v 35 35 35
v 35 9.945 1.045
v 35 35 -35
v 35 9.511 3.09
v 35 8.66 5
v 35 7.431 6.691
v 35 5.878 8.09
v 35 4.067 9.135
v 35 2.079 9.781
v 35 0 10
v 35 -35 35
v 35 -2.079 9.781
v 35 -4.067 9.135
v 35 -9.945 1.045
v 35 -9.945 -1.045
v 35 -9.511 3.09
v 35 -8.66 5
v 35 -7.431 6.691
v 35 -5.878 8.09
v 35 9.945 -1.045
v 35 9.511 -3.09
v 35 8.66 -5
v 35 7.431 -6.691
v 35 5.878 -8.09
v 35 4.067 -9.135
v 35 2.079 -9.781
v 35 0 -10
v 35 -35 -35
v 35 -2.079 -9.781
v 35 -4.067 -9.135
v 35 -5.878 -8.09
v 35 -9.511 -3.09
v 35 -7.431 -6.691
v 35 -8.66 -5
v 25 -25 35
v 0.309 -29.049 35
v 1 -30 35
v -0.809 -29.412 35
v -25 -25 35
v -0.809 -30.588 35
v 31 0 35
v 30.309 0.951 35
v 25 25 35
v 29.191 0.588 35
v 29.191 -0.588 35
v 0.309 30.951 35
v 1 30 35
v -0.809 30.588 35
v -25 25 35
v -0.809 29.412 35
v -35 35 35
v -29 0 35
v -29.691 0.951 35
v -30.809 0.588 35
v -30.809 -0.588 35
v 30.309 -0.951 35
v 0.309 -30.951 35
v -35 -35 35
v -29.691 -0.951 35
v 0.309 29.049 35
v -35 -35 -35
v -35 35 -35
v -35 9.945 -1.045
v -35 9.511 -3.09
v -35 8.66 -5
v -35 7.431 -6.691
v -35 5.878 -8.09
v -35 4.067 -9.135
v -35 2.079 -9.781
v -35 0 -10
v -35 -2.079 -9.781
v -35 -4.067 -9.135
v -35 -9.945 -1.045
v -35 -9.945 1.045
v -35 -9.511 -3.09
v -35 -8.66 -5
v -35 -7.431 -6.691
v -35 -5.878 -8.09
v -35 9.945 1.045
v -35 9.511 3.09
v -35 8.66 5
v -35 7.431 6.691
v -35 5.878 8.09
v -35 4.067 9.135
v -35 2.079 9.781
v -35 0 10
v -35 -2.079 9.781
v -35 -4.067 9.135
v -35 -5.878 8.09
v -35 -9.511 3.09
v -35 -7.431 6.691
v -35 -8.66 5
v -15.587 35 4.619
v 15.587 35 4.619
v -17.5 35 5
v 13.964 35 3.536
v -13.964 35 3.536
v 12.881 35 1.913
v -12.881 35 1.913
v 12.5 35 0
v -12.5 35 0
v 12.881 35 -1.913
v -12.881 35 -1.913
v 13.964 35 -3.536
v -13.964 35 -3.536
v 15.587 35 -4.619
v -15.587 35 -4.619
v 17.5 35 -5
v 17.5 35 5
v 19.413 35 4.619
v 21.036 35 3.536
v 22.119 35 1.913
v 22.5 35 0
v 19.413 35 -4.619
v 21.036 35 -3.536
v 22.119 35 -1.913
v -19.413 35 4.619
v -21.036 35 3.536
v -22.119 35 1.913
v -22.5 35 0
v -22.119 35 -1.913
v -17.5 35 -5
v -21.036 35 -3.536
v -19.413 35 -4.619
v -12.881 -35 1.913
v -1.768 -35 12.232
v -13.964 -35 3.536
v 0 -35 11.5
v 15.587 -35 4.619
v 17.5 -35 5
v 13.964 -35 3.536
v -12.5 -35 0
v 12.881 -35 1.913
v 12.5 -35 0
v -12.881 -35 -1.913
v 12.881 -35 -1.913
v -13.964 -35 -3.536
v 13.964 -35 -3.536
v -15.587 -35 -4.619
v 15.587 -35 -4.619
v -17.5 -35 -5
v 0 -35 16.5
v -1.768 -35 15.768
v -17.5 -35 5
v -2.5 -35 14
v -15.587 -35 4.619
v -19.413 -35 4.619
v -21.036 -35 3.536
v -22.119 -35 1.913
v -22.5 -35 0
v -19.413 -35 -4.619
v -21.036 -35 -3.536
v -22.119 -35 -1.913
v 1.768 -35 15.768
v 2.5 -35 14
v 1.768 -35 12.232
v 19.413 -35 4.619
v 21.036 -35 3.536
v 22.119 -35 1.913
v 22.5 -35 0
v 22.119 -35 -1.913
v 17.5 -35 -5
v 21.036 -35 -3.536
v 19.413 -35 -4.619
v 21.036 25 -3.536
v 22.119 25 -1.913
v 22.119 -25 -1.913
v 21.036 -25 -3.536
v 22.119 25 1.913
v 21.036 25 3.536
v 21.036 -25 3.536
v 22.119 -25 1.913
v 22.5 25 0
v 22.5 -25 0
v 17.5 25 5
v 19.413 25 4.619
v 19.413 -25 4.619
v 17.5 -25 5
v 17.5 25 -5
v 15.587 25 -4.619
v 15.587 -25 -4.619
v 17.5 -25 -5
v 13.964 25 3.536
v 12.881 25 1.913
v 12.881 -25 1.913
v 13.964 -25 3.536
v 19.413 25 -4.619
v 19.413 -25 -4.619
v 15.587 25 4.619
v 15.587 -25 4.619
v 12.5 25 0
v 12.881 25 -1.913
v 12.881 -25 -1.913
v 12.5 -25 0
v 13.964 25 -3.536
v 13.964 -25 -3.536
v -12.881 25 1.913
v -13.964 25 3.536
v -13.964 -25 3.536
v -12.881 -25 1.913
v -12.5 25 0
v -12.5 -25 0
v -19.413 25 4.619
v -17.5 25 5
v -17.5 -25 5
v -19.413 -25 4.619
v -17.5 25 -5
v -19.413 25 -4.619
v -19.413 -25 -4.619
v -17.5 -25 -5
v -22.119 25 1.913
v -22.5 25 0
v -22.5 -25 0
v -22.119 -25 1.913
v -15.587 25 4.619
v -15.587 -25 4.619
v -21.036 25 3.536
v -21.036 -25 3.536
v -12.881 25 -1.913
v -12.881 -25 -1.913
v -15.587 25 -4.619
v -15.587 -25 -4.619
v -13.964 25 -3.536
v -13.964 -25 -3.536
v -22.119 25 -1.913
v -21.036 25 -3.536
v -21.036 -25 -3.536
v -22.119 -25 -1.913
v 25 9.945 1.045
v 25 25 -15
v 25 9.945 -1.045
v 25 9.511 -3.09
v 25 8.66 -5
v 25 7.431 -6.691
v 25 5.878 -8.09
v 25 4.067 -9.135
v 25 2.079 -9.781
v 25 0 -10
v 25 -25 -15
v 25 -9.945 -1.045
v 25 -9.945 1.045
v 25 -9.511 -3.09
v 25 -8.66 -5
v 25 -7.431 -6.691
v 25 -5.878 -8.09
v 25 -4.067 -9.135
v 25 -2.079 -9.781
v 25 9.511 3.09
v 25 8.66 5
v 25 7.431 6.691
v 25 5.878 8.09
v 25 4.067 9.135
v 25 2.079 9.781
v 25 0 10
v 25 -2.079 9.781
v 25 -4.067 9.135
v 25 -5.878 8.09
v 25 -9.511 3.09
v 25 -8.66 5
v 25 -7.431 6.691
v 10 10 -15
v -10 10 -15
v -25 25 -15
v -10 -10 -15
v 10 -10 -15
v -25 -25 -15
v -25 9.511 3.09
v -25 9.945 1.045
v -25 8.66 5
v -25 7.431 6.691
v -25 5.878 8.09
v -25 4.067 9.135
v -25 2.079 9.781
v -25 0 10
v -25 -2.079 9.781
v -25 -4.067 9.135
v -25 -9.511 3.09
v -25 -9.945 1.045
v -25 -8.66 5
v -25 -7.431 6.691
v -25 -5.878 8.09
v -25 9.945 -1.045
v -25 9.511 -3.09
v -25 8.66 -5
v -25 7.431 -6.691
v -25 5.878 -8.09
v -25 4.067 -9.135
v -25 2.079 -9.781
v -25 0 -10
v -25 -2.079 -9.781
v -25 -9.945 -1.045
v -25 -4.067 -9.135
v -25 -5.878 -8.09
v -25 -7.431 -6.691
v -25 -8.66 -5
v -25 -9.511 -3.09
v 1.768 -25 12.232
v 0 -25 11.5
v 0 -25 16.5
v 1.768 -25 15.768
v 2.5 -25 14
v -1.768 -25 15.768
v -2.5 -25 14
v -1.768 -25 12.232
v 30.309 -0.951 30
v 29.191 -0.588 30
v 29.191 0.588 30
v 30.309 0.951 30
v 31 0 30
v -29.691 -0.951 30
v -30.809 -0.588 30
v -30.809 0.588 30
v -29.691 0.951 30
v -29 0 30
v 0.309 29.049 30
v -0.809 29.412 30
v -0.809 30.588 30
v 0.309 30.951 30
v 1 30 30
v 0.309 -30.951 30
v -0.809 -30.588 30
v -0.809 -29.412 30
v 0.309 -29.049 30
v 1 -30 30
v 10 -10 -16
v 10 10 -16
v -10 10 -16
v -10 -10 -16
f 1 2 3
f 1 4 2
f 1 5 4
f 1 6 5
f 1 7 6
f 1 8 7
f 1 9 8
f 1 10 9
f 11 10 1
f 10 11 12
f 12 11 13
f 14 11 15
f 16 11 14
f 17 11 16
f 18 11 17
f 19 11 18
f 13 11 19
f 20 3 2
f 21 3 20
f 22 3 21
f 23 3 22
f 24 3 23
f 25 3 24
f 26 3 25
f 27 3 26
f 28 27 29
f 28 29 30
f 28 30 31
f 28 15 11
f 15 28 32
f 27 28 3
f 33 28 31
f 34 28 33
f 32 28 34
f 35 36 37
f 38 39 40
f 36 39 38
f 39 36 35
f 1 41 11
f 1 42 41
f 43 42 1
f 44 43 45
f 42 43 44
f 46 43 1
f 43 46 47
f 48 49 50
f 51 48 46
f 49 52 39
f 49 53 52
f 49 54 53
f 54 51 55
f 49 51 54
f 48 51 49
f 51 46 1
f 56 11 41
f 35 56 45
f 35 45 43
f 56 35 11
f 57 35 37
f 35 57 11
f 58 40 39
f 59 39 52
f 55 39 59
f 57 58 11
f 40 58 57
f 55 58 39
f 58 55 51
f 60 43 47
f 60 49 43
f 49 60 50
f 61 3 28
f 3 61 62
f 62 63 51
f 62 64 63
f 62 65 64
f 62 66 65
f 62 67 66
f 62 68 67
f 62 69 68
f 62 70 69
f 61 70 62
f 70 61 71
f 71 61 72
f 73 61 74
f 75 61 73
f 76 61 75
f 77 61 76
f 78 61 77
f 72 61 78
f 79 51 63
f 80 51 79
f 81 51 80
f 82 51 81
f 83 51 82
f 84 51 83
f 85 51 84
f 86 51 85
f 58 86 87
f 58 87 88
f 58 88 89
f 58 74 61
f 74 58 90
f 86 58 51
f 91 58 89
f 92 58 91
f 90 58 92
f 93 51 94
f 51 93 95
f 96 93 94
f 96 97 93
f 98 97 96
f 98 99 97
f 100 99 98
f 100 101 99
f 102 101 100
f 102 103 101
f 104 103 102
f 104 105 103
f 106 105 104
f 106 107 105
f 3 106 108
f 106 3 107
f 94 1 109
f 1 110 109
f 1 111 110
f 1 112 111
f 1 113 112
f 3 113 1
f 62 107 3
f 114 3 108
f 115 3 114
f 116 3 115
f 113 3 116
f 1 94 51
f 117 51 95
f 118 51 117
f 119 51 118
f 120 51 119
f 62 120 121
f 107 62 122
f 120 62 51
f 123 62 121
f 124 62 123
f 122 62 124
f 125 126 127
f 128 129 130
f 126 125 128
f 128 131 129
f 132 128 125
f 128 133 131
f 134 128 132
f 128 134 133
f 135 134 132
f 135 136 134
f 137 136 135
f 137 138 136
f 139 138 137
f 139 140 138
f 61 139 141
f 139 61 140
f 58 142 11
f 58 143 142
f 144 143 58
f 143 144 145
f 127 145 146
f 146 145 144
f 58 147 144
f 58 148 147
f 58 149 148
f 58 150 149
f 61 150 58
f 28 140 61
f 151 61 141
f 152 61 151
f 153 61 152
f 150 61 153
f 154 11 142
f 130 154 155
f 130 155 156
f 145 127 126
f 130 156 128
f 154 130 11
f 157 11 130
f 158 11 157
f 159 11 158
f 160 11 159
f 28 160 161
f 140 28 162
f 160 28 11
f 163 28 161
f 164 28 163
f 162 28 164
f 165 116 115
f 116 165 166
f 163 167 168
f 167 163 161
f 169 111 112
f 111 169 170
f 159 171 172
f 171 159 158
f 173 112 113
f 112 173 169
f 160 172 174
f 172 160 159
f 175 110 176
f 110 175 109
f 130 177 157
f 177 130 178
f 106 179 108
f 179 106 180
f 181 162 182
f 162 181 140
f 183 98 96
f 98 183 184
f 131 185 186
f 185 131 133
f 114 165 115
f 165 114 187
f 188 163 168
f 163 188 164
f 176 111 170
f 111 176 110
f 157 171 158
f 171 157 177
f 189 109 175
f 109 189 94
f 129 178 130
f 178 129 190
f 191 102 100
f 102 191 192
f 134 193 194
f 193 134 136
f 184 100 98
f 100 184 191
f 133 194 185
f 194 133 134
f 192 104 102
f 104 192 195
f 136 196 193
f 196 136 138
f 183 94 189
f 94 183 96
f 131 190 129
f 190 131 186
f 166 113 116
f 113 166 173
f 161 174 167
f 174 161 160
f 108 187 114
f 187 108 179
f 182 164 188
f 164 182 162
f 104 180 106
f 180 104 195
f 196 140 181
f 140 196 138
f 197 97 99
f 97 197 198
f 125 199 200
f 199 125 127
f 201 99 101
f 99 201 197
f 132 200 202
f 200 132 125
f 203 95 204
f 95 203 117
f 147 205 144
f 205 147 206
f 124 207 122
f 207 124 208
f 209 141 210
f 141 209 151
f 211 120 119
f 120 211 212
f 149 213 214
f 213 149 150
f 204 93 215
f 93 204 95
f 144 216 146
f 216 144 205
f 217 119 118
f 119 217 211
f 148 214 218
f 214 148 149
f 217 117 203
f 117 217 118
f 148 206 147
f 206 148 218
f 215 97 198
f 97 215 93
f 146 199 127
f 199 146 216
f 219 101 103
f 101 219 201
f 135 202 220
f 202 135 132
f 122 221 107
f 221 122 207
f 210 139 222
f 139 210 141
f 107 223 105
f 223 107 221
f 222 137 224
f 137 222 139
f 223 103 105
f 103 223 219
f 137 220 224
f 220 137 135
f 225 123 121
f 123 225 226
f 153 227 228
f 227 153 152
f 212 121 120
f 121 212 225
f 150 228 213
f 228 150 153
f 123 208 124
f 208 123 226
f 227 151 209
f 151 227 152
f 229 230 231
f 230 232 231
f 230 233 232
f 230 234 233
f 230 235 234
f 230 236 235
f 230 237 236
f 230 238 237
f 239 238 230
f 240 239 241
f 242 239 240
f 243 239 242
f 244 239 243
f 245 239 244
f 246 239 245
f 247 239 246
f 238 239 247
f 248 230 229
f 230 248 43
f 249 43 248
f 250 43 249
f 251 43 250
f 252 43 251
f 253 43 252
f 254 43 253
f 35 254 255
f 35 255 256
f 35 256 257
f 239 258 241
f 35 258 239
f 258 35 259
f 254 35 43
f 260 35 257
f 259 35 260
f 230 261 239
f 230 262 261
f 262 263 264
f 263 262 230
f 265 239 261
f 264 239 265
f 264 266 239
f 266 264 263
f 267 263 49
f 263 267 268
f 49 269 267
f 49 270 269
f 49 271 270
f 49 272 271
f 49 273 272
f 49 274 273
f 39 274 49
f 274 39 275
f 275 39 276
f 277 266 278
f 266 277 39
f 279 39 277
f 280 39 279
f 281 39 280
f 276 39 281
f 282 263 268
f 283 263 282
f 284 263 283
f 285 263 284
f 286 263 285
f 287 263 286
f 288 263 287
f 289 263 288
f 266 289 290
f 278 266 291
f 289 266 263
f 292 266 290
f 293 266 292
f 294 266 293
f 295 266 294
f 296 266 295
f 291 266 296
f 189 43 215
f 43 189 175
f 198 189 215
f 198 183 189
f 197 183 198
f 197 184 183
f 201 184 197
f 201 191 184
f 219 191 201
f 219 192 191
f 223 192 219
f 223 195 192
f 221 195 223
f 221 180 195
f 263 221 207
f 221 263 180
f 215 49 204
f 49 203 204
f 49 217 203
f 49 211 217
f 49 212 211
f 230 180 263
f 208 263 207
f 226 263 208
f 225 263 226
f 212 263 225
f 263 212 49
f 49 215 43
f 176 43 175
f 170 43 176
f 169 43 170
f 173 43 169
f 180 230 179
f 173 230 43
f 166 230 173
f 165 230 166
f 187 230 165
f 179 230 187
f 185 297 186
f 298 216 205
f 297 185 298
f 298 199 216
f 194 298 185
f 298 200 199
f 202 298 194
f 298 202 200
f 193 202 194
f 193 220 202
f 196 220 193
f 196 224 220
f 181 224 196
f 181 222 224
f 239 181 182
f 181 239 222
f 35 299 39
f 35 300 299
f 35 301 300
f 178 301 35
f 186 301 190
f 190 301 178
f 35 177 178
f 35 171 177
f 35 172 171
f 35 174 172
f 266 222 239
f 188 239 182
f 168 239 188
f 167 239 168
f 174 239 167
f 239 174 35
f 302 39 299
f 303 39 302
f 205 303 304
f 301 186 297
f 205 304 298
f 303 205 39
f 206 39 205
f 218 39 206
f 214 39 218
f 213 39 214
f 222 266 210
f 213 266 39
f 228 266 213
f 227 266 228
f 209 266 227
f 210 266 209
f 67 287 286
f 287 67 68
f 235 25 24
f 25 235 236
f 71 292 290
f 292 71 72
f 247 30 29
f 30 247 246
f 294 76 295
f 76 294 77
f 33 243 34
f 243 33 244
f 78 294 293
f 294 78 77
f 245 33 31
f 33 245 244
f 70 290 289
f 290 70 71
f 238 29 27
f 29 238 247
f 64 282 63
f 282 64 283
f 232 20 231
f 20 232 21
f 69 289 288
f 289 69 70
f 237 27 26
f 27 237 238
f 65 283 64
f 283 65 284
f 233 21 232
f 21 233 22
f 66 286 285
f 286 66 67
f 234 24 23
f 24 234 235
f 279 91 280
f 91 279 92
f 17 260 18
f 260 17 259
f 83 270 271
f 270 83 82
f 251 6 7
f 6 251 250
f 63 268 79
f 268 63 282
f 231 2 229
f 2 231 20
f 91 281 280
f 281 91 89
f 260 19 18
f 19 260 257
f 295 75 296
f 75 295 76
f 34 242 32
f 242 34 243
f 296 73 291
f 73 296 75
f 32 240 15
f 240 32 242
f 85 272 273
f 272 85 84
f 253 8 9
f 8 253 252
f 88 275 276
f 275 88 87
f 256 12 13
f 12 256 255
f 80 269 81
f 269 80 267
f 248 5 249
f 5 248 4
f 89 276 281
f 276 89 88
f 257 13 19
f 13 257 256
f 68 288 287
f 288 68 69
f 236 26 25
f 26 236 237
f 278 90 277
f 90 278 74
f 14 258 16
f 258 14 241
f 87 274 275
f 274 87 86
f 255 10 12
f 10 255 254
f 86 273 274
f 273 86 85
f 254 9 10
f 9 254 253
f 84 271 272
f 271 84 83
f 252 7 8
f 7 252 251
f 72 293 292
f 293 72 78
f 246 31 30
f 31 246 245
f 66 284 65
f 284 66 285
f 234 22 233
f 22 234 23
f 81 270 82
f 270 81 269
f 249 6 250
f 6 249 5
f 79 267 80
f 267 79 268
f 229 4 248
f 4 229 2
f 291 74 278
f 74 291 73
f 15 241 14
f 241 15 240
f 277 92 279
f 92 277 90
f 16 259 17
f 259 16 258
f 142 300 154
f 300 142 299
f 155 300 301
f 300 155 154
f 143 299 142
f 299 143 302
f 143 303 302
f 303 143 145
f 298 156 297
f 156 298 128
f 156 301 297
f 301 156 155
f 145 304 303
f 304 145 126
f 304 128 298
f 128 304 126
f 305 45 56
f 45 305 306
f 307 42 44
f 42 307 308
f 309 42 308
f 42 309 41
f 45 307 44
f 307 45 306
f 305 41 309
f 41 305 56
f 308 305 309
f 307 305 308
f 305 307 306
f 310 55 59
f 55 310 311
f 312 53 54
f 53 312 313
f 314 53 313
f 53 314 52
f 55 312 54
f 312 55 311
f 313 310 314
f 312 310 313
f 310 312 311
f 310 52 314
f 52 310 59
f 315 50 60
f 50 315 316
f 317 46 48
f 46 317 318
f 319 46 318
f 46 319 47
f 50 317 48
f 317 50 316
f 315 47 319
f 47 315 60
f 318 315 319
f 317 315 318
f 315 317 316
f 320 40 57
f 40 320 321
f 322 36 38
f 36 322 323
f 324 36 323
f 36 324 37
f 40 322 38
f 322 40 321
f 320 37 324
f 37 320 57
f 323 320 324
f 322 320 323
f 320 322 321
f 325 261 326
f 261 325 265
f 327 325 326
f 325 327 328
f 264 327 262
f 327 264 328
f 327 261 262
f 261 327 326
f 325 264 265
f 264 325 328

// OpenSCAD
//Outer Shell
 //s_d= screw diameter
 //s_l= screw length

 module outer_shell(shell_l, shell_w, shell_h, thickness_l, thickness_w, thickness_h,s_d,s_l)
  {
      window_l= shell_l-thickness_l;
      window_w= shell_w-thickness_w;
      difference(){
      difference(){ 
      difference(){
      difference(){
      difference(){
         difference(){
             difference(){
                 difference(){
                     difference(){
                         difference(){
                         cube([shell_l,shell_w,shell_h], center=true);
                         rotate([90,0,0])
                         translate([shell_l/4,0,0])   
                         cylinder(r=5,h=(shell_w+1), center=true);}
                     rotate([90,0,0])
                     translate([-shell_l/4,0,0])    
                     cylinder(r=5,h=(shell_w+1), center=true);}

                  translate([0,0,thickness_h])
                  {cube ([window_l,window_w,shell_h], center=true);} }

     //electronics windows

                     rotate([0,90,0])
                     translate([0,0,0])    
                     cylinder(r=10,h=(shell_w+1), center=true);}

  //release valve hole
  rotate([90,0,0])
  {translate([0,shell_h/5,shell_w/3])
  cylinder(r=2.5,h=((shell_w/2)+1), center=true);}
  }
  //screws holes for quartz
  //1
  translate([shell_l/2-thickness_l/4,0,shell_h/2])
  cylinder(r=s_d/2,h=s_l, center=true);
  }
 //2
   translate([-(shell_l/2-thickness_l/4),0,shell_h/2])
  cylinder(r=s_d/2,h=s_l, center=true);
 }
 //3
 translate([0,(shell_w/2-thickness_w/4),shell_h/2])
  cylinder(r=s_d/2,h=s_l, center=true);
 }
 //4
 translate([0,-(shell_w/2-thickness_w/4),shell_h/2])
  cylinder(r=s_d/2,h=s_l, center=true);

 }
 cube([20,20,32], center=true);

 }


  }
  outer_shell(70,70,70,20,20,20,2,10);
